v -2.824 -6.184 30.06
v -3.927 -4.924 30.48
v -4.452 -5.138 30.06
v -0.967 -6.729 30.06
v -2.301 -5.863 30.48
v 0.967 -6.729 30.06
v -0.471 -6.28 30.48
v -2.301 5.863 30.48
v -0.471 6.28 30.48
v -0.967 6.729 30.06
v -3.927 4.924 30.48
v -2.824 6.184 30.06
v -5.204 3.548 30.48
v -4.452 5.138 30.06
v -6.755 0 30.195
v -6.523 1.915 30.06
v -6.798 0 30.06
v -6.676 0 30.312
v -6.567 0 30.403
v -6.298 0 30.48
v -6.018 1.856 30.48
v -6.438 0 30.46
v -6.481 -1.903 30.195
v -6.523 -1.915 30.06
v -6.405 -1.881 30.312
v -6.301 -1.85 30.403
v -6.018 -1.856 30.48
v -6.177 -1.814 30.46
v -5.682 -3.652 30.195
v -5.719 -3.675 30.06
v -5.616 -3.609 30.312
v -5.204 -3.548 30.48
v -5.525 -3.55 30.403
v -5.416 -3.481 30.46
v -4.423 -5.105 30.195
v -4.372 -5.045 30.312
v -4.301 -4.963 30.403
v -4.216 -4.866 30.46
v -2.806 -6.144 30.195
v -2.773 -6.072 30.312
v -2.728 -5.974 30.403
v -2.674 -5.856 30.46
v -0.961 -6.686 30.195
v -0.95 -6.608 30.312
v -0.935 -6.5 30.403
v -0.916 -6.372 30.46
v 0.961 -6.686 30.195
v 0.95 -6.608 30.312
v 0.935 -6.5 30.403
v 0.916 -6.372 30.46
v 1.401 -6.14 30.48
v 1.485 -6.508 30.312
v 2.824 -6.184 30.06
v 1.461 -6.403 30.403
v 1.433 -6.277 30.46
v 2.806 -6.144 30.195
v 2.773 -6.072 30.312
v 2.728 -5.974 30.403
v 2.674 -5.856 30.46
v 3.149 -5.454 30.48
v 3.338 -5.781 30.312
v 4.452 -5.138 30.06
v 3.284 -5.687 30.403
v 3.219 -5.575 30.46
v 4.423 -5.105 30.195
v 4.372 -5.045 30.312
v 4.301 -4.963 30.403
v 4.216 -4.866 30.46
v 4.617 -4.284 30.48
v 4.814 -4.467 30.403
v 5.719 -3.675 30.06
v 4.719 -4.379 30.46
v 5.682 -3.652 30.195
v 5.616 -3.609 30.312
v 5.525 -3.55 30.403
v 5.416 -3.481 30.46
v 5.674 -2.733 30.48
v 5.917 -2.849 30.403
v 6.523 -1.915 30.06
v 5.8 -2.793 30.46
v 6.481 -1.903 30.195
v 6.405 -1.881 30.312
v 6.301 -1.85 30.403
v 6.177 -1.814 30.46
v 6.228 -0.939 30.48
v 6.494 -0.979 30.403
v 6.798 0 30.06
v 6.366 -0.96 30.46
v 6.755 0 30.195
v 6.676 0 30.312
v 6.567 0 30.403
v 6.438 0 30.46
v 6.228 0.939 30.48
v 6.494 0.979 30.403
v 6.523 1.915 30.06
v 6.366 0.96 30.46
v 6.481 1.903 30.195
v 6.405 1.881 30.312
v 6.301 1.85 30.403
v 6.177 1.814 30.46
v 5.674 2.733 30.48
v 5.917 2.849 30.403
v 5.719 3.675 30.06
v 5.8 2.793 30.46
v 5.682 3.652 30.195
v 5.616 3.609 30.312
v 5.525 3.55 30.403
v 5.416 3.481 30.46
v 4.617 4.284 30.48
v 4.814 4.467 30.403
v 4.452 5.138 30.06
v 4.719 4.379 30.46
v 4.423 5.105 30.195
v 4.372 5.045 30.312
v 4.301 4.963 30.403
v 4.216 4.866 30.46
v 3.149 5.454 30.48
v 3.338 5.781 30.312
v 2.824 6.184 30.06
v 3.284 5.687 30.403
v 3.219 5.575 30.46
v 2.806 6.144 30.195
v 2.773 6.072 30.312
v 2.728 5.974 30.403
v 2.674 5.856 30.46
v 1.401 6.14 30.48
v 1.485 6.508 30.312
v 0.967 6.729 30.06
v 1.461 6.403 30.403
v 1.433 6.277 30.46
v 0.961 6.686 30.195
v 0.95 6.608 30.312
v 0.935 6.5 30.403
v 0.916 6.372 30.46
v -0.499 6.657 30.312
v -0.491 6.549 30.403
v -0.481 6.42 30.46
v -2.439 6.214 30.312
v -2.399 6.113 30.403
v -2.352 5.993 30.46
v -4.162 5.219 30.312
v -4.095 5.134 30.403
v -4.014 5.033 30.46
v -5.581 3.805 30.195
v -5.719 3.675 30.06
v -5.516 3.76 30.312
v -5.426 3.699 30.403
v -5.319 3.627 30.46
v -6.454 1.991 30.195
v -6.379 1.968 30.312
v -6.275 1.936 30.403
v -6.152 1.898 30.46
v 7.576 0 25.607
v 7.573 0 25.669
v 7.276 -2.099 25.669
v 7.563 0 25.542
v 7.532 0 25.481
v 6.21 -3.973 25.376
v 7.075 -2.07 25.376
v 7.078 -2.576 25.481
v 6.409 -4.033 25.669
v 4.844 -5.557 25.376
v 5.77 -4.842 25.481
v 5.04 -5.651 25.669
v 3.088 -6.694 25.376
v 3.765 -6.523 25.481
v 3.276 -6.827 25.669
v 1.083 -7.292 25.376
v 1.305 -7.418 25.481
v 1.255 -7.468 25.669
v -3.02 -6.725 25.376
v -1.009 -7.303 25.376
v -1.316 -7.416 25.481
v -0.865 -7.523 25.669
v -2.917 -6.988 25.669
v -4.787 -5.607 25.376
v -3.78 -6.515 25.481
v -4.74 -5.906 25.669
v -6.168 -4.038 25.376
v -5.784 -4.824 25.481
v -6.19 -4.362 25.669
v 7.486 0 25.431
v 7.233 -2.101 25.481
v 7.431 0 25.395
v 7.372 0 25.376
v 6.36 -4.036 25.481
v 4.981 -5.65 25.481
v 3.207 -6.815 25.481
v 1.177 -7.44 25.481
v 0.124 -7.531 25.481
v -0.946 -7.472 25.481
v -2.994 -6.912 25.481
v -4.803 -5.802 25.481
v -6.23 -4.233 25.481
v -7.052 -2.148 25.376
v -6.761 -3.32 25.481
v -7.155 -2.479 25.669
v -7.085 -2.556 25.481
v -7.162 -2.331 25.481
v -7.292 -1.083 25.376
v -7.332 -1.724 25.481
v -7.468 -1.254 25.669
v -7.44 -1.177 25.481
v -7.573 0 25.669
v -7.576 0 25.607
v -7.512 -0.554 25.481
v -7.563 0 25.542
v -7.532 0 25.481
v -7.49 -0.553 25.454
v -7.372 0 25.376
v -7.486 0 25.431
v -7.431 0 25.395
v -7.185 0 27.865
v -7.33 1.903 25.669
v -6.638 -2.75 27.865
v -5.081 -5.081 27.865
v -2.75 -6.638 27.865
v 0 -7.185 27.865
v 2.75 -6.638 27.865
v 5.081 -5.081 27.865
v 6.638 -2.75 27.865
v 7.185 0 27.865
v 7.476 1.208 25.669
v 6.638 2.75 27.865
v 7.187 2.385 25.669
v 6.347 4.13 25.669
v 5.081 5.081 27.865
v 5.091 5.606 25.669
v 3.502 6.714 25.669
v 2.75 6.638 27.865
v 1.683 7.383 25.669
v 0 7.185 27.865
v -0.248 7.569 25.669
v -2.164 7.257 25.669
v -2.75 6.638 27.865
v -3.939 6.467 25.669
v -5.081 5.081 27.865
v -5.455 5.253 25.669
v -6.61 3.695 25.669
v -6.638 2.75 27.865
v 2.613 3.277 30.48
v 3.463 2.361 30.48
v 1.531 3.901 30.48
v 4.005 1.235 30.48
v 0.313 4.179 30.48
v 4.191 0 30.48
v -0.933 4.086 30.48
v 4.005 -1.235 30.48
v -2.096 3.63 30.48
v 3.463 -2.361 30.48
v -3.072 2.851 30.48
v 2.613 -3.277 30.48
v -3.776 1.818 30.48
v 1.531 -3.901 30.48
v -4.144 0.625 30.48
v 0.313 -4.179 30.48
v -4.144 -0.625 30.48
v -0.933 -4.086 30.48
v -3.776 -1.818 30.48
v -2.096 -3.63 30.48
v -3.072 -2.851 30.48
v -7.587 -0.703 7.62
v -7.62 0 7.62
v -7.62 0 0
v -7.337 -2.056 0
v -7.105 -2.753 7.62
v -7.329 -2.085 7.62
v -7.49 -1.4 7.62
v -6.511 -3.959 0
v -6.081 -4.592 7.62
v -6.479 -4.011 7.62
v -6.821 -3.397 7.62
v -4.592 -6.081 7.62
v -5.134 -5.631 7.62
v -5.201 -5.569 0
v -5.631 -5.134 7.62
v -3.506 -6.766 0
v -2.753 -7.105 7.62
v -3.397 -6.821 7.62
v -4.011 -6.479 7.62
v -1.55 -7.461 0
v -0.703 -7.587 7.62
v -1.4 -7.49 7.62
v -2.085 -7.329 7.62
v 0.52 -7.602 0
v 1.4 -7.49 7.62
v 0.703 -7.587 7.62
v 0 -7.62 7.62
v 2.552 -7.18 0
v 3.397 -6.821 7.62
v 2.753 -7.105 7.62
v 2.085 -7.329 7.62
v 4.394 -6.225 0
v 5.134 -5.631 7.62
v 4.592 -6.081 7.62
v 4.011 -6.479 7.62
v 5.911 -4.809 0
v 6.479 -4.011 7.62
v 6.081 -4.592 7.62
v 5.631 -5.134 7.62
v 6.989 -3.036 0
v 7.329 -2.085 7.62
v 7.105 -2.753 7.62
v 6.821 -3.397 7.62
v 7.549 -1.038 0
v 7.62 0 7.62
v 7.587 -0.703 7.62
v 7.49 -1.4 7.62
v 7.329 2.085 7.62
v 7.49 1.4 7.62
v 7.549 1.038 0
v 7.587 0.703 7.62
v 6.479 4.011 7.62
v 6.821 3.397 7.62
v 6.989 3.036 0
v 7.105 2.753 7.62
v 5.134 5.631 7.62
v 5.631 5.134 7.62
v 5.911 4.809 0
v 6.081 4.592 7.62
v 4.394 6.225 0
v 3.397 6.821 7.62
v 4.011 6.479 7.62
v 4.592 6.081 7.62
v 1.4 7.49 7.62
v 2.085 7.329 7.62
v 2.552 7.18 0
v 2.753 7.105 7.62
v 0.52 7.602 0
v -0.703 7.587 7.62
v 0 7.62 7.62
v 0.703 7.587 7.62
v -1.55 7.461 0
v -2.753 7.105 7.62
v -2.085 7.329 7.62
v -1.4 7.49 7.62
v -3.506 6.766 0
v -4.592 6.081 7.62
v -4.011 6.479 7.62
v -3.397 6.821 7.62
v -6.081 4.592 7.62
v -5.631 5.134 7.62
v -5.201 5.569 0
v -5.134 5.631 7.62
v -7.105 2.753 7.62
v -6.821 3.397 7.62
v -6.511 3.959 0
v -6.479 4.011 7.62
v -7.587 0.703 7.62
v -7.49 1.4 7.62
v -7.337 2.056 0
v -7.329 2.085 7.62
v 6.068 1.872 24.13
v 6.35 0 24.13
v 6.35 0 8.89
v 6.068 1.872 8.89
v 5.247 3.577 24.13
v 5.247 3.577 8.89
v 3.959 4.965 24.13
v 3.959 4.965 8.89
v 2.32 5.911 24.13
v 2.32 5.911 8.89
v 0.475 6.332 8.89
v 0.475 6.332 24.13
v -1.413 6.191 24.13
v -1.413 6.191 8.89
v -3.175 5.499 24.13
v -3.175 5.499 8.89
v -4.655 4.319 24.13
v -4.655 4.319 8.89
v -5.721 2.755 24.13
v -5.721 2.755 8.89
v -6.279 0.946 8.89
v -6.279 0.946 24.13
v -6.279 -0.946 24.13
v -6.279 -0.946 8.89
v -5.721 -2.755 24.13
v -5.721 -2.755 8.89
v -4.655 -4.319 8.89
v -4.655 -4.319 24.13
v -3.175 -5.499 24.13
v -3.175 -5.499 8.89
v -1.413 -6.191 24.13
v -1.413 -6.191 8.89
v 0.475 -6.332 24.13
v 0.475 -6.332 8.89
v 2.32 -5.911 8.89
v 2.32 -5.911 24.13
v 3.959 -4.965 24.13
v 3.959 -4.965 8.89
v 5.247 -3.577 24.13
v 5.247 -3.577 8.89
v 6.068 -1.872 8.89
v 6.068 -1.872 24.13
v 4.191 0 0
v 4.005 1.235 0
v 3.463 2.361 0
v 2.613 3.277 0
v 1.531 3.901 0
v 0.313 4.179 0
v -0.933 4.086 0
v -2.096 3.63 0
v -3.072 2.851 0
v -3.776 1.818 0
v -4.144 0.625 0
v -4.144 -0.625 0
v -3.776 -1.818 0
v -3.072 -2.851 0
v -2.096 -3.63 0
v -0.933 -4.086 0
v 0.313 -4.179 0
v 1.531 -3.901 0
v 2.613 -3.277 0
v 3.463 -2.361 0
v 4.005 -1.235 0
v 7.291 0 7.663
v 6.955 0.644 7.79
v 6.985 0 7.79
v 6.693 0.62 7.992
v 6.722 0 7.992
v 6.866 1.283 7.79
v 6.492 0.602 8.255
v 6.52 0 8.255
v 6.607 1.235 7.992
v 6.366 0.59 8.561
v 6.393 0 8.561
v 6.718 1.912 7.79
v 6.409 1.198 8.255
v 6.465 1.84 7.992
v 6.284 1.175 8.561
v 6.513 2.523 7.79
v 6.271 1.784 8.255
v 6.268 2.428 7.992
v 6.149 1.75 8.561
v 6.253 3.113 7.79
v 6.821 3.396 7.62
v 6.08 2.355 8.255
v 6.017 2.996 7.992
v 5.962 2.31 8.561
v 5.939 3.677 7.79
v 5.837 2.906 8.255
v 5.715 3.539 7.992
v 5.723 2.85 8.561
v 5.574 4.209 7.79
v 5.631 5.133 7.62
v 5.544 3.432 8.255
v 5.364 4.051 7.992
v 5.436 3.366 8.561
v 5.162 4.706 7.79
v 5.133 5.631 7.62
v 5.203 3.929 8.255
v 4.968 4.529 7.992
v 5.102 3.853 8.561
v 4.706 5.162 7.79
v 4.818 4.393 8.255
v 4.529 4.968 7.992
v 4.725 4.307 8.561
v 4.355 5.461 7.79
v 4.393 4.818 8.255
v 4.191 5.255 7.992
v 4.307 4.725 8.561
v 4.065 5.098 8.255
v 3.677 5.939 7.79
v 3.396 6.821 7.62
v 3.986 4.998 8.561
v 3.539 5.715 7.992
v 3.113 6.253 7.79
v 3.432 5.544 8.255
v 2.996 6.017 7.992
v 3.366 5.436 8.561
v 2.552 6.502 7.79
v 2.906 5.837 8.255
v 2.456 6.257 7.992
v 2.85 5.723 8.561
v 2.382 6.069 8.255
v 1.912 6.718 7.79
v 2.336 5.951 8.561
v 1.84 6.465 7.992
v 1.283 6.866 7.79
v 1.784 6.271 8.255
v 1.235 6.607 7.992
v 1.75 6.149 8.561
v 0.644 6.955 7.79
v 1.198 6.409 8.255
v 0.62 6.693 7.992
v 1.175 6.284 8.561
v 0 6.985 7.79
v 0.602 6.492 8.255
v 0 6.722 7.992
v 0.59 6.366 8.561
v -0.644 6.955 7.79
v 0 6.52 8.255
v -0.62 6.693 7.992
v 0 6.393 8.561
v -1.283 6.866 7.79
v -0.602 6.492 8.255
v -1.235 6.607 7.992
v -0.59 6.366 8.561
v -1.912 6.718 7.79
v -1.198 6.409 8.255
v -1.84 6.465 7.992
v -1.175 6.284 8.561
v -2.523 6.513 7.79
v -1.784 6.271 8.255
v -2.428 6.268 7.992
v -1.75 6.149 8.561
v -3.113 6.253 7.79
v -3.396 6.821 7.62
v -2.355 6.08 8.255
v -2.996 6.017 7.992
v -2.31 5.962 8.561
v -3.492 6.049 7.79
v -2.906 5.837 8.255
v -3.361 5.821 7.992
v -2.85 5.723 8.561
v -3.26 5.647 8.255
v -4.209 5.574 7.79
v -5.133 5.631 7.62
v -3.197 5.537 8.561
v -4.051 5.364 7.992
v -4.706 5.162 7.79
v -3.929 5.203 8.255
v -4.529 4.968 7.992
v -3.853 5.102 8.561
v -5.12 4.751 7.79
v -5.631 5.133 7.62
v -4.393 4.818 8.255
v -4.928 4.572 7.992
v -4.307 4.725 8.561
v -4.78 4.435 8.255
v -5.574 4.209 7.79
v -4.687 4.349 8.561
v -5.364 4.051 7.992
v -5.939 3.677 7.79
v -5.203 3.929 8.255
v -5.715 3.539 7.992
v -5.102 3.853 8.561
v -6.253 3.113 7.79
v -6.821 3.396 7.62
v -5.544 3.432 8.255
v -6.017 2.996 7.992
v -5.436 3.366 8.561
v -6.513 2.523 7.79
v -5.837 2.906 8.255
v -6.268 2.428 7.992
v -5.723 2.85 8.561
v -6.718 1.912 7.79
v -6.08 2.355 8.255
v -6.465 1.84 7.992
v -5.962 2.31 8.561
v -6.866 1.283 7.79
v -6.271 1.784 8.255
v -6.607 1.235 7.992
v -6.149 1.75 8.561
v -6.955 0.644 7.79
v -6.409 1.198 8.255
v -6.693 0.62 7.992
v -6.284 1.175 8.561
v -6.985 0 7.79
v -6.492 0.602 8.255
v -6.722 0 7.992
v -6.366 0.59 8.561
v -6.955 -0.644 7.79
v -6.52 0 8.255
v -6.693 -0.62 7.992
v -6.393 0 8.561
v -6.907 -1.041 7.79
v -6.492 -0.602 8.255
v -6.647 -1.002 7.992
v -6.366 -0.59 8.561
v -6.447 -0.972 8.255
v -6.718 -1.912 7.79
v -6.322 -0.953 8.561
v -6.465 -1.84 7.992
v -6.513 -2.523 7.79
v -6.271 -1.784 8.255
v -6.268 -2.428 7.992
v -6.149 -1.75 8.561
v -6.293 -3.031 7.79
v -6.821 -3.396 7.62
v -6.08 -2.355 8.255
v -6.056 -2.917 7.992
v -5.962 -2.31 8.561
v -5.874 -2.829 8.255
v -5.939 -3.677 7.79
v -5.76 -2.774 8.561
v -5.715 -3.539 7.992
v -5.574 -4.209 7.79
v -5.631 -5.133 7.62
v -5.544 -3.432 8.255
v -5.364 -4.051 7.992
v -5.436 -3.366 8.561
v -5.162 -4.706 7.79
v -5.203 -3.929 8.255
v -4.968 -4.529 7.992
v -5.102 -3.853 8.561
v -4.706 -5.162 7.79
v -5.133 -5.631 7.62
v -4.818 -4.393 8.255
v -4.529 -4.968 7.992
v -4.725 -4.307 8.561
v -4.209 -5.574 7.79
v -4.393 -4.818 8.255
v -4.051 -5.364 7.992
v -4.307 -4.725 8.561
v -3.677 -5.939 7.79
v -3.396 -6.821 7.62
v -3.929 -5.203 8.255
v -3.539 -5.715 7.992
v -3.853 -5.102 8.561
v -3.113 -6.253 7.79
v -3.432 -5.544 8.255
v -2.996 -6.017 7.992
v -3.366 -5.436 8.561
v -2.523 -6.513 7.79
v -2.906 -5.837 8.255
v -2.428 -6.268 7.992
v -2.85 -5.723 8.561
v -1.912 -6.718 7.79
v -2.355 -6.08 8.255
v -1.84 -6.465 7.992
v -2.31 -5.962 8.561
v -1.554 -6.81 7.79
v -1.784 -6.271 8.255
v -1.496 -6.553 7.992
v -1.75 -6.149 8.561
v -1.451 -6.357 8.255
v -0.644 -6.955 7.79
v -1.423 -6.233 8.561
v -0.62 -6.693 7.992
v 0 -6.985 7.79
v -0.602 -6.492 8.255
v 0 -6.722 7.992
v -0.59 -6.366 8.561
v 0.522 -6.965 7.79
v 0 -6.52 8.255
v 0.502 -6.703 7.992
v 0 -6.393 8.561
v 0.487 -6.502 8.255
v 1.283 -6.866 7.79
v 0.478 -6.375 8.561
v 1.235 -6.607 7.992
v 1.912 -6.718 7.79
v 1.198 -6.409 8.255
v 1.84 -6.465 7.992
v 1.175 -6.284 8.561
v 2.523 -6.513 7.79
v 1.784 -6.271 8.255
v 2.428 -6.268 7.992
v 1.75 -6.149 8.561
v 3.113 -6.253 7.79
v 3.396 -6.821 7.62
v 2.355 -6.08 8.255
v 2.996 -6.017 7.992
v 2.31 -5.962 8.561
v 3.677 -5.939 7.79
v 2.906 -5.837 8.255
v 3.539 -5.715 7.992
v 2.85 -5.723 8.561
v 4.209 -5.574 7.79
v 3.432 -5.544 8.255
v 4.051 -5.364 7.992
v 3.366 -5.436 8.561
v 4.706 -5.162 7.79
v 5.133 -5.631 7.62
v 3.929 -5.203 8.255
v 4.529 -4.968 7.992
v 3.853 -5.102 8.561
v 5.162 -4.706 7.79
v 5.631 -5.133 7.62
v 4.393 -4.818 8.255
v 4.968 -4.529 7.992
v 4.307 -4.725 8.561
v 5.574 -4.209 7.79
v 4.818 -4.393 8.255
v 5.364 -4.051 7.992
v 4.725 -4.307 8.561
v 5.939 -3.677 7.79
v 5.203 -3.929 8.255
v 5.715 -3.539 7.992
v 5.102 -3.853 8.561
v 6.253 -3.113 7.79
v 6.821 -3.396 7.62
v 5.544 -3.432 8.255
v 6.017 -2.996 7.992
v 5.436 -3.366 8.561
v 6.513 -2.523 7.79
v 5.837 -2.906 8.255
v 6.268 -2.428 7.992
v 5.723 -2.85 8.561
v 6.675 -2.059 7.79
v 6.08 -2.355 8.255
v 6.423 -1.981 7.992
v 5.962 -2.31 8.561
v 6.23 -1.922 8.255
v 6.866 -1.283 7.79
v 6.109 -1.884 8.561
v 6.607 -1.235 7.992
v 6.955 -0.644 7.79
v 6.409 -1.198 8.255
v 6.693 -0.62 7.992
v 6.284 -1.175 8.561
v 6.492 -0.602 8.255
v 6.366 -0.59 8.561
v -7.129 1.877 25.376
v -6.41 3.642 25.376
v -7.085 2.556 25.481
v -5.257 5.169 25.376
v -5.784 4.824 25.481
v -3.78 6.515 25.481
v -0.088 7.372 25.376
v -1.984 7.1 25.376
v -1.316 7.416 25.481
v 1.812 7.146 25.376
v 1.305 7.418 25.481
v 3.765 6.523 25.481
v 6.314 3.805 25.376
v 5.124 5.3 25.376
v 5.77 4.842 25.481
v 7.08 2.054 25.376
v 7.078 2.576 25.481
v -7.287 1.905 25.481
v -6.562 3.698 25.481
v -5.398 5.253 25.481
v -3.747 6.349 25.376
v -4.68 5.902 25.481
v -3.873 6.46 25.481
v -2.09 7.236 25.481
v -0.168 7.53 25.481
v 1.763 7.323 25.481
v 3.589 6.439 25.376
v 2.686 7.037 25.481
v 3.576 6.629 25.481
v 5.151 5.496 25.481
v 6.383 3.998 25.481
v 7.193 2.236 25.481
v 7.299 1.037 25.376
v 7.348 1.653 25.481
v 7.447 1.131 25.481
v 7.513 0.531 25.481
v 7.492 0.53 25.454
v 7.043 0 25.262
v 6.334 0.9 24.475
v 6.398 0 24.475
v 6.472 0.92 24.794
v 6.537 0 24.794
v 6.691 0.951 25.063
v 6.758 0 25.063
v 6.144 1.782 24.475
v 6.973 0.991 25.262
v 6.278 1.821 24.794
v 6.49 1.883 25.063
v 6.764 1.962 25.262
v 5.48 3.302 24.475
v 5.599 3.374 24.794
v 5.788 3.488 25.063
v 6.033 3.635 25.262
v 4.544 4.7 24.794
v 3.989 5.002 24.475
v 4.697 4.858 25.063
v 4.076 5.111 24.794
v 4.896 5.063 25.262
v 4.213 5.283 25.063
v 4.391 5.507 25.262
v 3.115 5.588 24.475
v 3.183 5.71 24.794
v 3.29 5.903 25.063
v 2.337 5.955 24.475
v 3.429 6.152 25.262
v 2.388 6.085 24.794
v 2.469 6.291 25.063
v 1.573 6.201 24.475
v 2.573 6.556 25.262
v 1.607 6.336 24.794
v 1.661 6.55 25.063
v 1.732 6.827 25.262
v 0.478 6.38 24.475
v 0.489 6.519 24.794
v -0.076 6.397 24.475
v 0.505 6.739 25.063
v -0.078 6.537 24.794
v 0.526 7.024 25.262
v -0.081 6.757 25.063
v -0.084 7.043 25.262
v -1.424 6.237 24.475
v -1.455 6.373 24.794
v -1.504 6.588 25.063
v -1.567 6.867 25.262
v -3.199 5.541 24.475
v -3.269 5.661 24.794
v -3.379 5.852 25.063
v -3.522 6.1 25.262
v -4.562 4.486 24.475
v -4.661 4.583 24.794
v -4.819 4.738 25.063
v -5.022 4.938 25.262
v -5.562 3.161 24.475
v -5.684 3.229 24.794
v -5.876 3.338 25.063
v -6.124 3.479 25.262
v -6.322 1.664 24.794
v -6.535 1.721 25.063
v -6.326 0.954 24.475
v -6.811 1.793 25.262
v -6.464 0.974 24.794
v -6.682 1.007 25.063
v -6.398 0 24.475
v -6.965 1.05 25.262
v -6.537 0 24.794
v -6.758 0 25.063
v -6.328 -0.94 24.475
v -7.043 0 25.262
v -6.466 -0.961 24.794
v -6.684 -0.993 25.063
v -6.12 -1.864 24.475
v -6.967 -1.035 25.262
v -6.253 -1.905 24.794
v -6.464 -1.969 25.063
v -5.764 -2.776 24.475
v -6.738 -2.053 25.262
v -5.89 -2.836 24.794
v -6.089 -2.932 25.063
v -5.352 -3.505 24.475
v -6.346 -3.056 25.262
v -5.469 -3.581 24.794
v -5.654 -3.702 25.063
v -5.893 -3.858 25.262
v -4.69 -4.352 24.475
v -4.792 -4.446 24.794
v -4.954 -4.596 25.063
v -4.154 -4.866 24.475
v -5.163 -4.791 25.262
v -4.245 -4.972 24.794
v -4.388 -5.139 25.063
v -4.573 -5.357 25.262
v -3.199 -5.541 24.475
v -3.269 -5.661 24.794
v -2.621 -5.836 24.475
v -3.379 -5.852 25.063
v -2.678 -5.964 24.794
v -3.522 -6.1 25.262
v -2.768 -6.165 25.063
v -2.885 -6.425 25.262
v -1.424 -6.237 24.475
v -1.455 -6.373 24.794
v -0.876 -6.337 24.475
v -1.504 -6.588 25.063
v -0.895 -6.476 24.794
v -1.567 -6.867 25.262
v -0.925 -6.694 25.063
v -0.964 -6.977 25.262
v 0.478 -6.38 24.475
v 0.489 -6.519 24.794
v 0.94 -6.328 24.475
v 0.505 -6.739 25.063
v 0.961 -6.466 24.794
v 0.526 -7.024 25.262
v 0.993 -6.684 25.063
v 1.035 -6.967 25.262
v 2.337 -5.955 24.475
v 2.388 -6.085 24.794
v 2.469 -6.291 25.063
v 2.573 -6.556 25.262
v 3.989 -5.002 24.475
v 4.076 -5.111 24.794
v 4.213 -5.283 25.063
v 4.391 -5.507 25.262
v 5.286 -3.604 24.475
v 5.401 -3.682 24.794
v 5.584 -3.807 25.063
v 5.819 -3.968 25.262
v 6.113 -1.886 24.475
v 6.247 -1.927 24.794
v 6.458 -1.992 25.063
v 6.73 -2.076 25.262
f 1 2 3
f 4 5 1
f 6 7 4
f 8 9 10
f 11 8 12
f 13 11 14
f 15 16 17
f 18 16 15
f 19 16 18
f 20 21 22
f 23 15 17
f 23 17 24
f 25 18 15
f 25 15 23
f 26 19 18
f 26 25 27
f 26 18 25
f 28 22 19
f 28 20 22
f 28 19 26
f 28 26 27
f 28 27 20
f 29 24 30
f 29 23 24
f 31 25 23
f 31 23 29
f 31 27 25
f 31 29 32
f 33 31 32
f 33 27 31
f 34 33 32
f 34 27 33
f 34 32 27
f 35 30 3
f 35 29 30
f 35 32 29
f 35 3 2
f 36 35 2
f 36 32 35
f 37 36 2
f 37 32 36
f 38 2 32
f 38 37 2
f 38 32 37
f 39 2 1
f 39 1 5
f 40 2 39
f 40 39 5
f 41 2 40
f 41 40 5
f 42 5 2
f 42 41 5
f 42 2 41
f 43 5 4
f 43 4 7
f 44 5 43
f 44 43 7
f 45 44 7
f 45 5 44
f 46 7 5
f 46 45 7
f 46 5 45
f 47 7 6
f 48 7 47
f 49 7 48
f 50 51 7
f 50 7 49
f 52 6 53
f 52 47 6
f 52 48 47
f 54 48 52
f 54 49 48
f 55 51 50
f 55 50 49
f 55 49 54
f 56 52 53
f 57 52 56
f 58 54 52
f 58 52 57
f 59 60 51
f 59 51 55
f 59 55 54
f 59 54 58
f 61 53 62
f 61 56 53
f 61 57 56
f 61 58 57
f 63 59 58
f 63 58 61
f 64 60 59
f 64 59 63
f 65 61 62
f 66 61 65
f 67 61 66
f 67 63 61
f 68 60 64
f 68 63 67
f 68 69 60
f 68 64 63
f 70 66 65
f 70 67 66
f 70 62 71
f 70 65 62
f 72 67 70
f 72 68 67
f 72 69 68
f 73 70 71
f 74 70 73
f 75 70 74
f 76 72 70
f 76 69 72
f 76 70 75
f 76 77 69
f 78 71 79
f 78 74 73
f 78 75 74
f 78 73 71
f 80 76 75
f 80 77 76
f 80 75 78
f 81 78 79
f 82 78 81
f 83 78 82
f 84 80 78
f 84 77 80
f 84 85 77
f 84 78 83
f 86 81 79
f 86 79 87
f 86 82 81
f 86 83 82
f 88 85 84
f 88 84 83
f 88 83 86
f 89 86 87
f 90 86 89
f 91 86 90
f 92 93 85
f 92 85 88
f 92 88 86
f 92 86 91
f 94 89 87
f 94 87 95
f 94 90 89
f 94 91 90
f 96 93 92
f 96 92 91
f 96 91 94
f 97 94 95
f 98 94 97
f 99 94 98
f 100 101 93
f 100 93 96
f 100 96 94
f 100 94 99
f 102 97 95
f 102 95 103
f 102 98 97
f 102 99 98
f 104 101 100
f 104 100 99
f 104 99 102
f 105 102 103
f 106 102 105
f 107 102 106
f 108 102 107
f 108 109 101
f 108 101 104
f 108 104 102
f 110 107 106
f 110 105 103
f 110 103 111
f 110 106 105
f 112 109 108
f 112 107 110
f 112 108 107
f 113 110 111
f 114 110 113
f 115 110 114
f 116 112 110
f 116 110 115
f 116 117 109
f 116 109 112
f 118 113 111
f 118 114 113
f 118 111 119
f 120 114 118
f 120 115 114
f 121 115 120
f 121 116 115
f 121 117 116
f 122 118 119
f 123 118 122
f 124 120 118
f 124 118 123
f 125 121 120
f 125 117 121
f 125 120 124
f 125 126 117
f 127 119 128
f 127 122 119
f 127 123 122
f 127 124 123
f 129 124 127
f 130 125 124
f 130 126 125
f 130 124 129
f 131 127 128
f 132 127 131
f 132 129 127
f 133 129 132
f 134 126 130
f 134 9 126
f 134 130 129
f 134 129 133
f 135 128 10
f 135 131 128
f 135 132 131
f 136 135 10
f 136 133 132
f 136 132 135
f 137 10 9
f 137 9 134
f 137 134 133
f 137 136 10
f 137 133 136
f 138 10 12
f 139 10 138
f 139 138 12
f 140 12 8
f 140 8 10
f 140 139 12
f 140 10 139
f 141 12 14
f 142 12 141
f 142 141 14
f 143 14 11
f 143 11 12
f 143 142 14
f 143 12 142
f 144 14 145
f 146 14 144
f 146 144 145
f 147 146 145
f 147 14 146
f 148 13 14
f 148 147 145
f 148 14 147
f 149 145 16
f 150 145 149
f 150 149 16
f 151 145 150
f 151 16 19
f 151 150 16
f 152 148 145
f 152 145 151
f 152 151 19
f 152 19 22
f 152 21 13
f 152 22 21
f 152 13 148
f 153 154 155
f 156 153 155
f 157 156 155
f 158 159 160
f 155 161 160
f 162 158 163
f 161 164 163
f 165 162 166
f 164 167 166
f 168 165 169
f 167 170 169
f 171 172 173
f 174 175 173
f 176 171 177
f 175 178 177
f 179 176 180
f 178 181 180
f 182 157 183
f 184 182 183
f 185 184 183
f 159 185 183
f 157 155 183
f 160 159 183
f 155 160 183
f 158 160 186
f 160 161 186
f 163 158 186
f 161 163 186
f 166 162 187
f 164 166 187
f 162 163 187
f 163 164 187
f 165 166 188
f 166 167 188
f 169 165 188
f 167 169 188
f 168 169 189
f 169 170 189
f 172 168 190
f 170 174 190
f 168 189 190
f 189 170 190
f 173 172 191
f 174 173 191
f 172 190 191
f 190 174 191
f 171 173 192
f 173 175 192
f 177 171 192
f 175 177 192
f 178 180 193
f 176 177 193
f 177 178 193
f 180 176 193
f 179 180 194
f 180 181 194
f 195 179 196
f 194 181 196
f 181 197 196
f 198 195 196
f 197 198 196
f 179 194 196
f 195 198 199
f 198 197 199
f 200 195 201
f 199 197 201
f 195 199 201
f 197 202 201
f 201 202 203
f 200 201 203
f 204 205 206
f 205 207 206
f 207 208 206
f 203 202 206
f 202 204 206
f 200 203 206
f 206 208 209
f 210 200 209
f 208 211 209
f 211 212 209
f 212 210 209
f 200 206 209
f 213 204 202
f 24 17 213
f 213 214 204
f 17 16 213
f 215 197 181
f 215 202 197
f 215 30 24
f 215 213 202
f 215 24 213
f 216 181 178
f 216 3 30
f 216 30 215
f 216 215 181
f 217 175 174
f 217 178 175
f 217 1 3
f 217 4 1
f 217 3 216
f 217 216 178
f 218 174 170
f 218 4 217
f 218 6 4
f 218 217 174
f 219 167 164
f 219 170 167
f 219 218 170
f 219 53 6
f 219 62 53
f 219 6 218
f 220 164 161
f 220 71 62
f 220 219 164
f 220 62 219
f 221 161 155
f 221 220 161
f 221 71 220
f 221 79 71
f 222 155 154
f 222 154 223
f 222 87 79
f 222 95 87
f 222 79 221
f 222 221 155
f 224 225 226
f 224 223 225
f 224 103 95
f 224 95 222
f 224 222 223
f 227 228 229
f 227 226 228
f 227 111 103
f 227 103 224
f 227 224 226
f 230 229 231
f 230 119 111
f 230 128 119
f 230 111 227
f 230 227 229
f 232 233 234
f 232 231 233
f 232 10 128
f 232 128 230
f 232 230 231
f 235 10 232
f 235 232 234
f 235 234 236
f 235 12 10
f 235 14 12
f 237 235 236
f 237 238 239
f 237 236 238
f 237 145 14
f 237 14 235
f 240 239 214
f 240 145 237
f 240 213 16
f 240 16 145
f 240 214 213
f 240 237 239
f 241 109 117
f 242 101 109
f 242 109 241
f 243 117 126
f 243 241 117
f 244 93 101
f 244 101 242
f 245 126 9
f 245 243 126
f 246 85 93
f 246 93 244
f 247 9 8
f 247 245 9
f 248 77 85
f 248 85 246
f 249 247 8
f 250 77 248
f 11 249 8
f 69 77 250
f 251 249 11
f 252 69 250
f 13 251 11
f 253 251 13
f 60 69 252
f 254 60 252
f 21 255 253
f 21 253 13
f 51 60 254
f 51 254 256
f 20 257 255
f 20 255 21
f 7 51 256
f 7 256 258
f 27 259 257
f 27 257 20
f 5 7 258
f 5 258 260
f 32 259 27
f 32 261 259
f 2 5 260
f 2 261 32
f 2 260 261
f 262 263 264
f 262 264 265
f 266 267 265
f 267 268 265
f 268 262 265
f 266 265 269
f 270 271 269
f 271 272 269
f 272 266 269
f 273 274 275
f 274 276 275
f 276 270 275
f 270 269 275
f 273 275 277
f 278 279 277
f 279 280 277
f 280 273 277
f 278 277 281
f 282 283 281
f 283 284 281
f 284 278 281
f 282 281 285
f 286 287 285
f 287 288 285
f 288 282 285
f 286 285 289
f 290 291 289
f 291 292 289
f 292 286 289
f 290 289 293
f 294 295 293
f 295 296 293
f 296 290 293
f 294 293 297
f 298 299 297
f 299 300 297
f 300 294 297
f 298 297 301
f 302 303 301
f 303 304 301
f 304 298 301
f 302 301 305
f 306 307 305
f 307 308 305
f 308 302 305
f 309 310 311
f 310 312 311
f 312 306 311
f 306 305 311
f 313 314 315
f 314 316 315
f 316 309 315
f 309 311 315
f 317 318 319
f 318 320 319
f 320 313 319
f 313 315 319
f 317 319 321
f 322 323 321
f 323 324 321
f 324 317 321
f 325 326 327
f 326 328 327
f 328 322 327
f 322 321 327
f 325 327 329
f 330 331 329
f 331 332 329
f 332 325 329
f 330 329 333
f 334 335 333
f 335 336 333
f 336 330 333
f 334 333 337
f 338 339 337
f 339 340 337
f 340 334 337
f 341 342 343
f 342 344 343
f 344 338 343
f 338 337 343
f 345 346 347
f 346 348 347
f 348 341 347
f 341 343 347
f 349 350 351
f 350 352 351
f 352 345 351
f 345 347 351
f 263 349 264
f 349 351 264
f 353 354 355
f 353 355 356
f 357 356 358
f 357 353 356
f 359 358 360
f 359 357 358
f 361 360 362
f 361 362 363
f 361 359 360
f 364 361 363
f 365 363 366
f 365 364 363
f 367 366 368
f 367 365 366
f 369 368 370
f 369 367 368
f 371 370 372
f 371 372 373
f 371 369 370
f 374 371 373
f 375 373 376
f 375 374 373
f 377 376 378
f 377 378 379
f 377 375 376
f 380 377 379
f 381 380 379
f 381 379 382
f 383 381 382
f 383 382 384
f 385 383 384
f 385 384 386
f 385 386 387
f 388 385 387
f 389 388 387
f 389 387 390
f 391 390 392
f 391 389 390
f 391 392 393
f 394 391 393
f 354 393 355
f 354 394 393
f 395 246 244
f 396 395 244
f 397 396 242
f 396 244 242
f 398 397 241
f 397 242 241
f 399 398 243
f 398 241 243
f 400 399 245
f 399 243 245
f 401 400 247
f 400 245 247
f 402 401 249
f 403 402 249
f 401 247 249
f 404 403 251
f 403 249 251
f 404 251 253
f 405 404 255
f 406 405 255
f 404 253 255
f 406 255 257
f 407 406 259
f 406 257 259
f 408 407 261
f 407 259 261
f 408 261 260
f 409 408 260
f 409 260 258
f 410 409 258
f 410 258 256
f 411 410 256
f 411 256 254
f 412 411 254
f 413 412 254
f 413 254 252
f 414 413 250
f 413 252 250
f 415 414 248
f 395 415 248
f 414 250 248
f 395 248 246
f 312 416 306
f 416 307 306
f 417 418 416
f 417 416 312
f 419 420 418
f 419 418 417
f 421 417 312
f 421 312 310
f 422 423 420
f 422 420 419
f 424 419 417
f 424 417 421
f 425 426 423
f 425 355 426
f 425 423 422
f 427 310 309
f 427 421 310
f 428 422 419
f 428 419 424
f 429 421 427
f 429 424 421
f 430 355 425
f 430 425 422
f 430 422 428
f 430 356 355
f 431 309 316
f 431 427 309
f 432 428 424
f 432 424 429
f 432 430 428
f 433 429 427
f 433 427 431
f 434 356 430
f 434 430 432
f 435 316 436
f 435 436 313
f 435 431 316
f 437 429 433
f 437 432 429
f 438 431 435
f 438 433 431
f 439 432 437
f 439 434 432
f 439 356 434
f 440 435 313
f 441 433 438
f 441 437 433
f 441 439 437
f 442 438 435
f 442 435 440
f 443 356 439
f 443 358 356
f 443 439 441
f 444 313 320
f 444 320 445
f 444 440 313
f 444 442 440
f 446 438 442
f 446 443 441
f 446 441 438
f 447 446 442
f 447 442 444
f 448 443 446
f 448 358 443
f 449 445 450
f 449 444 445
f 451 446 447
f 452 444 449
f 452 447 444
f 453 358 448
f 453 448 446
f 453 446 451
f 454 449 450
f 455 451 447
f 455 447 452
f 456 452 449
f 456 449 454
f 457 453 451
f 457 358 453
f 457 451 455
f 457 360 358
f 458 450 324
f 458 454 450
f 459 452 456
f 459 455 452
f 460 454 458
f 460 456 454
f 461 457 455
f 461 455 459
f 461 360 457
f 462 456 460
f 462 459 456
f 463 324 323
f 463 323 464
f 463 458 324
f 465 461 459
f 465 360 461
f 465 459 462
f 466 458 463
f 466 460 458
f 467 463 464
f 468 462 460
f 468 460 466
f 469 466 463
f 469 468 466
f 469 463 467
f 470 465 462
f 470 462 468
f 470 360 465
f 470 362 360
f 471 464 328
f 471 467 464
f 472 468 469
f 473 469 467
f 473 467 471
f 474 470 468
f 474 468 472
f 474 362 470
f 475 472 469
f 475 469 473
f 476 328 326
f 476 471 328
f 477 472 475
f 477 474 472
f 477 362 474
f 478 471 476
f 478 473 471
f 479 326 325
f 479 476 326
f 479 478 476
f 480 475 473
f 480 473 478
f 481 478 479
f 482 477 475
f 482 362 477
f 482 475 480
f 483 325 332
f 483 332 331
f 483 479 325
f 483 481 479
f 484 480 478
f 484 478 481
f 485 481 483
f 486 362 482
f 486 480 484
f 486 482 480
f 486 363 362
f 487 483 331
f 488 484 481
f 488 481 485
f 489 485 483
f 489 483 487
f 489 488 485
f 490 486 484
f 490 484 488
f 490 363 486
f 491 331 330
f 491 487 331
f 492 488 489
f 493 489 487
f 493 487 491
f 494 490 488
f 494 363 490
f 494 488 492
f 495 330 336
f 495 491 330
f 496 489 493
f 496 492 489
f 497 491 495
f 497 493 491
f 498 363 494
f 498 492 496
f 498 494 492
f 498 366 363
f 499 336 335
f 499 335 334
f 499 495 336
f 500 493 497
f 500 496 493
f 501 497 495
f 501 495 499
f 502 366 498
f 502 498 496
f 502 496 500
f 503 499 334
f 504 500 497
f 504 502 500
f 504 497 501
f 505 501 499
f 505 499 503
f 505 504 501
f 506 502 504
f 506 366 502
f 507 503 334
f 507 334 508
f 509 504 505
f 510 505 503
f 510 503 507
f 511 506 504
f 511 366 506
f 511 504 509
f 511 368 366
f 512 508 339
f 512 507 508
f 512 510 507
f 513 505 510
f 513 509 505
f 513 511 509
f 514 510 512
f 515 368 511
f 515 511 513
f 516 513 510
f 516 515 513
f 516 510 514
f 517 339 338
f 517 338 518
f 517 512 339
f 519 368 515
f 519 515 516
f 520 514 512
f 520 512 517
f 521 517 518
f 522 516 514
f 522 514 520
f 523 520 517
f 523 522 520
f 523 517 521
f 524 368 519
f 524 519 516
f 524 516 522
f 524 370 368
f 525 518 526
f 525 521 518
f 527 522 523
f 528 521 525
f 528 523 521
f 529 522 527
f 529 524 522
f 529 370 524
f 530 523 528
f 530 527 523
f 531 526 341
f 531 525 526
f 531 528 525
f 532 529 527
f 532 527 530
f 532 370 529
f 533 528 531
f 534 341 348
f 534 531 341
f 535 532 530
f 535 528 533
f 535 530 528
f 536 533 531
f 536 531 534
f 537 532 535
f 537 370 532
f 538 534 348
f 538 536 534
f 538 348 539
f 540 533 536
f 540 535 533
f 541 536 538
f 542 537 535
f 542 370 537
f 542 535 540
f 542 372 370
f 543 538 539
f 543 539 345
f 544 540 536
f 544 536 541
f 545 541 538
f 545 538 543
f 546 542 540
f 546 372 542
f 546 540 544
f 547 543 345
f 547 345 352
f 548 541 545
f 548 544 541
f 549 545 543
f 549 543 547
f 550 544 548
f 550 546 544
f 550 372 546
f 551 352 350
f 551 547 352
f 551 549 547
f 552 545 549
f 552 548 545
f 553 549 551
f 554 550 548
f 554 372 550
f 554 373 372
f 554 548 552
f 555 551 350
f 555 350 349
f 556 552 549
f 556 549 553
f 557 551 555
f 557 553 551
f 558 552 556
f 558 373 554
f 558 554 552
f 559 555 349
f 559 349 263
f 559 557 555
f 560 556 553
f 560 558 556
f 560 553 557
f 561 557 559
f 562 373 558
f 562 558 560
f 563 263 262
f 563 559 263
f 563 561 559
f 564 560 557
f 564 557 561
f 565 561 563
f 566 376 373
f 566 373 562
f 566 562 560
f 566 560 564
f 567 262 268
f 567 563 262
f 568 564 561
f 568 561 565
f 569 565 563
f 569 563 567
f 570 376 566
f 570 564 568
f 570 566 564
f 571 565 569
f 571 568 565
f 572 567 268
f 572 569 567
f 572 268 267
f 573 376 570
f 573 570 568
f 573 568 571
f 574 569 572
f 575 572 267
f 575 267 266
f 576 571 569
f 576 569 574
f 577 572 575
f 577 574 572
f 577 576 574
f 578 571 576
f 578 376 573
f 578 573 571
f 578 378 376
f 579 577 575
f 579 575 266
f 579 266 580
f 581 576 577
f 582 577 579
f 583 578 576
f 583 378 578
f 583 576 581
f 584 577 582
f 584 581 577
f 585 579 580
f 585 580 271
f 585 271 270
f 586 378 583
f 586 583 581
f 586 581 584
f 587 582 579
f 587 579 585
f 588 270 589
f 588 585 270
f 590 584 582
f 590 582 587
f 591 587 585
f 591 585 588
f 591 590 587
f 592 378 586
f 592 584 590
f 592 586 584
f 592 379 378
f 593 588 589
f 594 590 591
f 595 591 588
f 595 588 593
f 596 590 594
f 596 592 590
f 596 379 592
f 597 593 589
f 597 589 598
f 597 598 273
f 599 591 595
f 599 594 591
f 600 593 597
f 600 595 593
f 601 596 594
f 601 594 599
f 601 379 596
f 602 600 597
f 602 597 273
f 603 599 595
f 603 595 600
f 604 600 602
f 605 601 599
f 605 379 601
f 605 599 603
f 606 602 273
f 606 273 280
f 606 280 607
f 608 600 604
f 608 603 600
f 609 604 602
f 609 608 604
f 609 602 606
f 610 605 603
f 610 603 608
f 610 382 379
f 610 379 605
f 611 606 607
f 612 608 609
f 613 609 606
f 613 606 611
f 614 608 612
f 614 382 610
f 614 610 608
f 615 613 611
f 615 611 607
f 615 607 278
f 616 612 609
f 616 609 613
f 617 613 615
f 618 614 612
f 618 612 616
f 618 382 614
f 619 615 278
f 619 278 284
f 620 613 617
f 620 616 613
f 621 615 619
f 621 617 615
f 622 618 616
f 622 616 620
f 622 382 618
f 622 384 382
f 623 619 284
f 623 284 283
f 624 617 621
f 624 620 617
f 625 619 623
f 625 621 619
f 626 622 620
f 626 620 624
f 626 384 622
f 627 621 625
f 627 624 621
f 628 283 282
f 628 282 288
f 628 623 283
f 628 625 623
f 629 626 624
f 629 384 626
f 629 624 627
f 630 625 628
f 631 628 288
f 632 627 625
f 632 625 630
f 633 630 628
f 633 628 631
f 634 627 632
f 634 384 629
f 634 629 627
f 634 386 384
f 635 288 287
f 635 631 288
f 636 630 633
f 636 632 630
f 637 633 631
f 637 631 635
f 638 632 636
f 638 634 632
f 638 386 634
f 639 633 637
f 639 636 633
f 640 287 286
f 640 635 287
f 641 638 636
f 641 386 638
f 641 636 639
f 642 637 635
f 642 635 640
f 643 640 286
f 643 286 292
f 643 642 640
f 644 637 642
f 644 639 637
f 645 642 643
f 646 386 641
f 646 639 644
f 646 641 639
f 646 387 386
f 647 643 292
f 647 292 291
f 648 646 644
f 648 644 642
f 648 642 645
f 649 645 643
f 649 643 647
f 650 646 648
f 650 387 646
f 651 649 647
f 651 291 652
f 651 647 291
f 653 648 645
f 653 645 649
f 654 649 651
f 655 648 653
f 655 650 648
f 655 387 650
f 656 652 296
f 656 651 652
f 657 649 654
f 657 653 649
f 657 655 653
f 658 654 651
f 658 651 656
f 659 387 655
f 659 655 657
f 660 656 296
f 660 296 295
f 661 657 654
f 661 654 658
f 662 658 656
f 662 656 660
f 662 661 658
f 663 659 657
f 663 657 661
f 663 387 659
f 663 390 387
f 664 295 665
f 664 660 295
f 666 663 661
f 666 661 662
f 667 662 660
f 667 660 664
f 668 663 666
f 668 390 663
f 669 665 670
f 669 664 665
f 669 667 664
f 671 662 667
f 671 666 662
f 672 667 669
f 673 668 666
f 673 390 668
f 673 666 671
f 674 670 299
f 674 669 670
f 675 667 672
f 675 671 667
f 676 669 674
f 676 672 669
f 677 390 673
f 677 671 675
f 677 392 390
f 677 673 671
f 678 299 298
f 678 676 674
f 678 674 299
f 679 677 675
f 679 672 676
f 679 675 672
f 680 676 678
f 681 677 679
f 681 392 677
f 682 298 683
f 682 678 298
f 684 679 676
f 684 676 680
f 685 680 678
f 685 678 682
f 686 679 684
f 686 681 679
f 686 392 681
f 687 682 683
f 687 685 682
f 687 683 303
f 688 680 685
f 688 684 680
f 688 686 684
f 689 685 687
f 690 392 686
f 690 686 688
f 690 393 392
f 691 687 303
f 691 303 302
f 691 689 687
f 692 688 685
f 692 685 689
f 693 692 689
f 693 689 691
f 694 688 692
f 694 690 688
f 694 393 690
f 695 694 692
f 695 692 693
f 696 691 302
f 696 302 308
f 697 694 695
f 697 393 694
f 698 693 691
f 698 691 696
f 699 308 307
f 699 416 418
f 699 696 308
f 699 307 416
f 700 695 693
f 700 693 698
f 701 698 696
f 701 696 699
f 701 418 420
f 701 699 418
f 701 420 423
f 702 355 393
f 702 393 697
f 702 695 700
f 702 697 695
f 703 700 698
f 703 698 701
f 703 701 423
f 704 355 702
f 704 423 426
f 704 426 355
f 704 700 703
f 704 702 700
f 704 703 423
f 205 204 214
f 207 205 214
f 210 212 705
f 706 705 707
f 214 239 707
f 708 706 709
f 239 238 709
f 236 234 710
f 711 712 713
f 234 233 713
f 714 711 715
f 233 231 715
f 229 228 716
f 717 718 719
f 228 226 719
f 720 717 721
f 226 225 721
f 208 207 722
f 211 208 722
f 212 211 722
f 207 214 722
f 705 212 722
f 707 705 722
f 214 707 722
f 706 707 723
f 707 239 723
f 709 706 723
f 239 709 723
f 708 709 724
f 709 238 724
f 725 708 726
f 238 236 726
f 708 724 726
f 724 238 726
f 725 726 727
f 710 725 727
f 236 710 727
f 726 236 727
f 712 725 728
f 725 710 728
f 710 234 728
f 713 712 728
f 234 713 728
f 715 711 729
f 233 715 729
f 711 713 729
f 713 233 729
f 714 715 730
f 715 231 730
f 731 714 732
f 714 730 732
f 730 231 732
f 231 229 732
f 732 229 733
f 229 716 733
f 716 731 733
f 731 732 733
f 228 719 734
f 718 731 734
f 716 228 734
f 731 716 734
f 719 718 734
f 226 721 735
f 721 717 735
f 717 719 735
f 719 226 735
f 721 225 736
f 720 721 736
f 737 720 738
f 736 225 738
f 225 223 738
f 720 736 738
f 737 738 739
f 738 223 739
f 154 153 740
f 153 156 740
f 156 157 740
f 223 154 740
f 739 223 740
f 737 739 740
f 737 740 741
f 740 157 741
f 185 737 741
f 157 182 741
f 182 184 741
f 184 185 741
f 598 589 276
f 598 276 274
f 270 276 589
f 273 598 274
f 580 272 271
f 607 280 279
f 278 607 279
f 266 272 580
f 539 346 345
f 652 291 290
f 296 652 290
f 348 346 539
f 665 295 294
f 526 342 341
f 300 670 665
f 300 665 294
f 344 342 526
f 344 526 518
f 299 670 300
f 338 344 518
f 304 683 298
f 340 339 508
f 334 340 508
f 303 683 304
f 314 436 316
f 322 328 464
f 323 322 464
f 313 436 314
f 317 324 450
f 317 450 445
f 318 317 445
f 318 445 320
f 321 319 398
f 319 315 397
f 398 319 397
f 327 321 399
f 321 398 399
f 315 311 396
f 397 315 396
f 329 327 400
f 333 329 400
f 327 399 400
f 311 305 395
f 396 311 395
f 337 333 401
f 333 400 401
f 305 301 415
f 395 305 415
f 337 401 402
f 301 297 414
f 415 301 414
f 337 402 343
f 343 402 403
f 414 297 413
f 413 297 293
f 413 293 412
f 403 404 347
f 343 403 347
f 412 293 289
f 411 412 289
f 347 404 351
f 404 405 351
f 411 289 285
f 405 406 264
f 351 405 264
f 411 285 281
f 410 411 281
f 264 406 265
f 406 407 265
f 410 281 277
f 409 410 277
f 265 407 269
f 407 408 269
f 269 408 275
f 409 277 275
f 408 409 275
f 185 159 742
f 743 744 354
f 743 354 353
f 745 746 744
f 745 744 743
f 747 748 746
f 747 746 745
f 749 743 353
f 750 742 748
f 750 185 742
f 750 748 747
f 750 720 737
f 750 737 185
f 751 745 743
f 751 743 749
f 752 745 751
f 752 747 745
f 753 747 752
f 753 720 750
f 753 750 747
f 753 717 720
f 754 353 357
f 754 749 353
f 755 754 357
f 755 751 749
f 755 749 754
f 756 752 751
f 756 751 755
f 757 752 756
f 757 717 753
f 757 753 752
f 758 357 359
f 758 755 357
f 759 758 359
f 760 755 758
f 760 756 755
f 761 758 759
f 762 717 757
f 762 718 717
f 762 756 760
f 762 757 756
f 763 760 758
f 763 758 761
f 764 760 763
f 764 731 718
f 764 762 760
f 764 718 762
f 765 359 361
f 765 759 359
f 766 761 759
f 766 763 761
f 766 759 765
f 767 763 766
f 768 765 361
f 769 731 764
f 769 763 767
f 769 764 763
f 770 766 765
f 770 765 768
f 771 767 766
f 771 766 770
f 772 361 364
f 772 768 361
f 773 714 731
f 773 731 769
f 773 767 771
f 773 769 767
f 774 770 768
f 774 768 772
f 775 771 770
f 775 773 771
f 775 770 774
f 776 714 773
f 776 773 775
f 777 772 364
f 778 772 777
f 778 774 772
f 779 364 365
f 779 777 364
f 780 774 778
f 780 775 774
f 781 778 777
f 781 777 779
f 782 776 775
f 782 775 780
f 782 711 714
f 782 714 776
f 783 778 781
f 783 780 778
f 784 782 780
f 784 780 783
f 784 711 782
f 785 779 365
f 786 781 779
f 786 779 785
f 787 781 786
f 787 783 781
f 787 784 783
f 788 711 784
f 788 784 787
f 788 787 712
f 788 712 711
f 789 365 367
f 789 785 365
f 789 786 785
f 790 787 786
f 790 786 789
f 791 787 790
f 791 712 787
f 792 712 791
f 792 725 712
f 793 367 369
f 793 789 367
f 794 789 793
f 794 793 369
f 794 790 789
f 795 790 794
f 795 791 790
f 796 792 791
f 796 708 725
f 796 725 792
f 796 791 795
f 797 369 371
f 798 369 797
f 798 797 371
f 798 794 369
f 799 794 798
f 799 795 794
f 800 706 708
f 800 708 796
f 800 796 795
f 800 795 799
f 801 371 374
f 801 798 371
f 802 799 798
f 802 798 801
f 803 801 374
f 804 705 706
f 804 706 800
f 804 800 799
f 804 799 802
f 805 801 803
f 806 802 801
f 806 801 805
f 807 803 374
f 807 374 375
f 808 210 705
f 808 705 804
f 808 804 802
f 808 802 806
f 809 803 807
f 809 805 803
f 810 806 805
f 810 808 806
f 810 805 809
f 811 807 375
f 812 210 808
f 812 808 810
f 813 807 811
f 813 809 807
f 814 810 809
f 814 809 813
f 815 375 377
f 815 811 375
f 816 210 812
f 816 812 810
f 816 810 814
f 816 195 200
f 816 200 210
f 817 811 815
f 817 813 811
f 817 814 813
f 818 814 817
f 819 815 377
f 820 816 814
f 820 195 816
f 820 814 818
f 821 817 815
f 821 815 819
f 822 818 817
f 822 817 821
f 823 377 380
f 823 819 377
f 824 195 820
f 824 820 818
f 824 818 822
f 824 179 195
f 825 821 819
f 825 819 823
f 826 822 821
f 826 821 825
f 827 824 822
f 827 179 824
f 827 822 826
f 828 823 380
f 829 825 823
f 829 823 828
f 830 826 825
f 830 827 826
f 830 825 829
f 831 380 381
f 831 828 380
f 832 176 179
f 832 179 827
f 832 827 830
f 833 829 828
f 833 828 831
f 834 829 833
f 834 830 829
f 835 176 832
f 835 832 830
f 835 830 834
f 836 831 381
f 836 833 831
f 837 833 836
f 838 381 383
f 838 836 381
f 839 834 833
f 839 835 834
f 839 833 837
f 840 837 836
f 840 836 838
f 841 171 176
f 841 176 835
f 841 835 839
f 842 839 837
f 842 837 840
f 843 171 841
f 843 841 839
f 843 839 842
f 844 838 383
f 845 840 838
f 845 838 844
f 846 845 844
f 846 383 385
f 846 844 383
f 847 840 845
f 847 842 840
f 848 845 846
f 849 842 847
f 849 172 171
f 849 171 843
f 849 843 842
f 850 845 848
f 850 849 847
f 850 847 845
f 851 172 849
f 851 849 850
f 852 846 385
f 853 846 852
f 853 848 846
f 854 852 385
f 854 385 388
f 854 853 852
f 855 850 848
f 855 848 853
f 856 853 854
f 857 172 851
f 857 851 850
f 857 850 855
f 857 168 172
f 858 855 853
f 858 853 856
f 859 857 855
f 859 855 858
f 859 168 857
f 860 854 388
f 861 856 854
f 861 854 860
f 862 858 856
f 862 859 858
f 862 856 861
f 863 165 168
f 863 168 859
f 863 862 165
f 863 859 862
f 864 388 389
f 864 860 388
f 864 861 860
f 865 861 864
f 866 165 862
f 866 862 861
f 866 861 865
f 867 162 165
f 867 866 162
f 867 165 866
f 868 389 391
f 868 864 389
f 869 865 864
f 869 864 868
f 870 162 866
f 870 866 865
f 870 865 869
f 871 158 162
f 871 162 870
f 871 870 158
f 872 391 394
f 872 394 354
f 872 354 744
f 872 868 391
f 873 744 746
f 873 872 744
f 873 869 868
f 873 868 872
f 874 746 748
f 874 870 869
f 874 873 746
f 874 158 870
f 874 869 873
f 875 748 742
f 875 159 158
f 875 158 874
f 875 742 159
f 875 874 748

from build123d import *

# Parameters (mm, degrees)
SKETCH1_R           = 7.62
BOSS_EXTRUDE1_DEPTH = 30.48
SKETCH2_R           = 4.191
CUT_EXTRUDE1_DEPTH  = 30.48
CUT_EXTRUDE2_START  = -5.08
SKETCH3_R           = 10.16
SKETCH3_R_2         = 6.35
CUT_EXTRUDE2_DEPTH  = 17.78
FILLET1_R           = 1.27
FILLET2_R           = 1.27
CHAMFER1_SIZE       = 5.08
CHAMFER1_SIZE_2     = 0.895741062
FILLET3_R           = 0.508
FILLET4_R           = 0.254


# Some blends are built 0.0001 mm under size
with BuildPart() as part:
    # Sketch1 → Boss-Extrude1 (new body)
    with BuildSketch(Plane.XY):
        with Locations(Location((0, 0, 0), (0, 0, 180))):
            Circle(SKETCH1_R)
    extrude(amount=BOSS_EXTRUDE1_DEPTH)

    # Sketch2 → Cut-Extrude1 (cut)
    with BuildSketch(Plane.XY.offset(30.48)):
        Circle(SKETCH2_R)
    extrude(amount=-CUT_EXTRUDE1_DEPTH, mode=Mode.SUBTRACT)

    # Sketch3 → Cut-Extrude2 (cut)
    with BuildSketch(Plane.XY.offset(30.48).offset(CUT_EXTRUDE2_START)):
        Circle(SKETCH3_R)
        Circle(SKETCH3_R_2, mode=Mode.SUBTRACT)
    extrude(amount=-CUT_EXTRUDE2_DEPTH, mode=Mode.SUBTRACT)

    # Fillet1
    fillet1_edges = [part.edges().sort_by_distance(p)[0] for p in [
        (-6.35, 0, 7.62),
    ]]
    fillet(fillet1_edges, radius=FILLET1_R - 0.0001)  # a hair under: the kernel refuses the full size

    # Fillet2
    fillet2_edges = [part.edges().sort_by_distance(p)[0] for p in [
        (-6.35, 0, 25.4),
    ]]
    fillet(fillet2_edges, radius=FILLET2_R - 0.0001)  # a hair under: the kernel refuses the full size

    # Chamfer1
    # the kernel refuses this chamfer: 5.08, 0.895741062 mm, written as the material it takes off along each edge
    with BuildSketch(Plane(origin=(0, 0, 30.48), x_dir=(-1, 0, 0), z_dir=(0, 1, 0))) as chamfer1_piece_1:
        Polygon((7.62, -CHAMFER1_SIZE), (7.62 - CHAMFER1_SIZE_2, 0), (7.62, 0), align=None)
    revolve(axis=Axis((0, 0, 30.48), (0, 0, 1)), mode=Mode.SUBTRACT)

    # Fillet3
    fillet3_edges = [part.edges().sort_by_distance(p)[0] for p in [
        (6.724258938, 0, 30.48),
    ]]
    fillet(fillet3_edges, radius=FILLET3_R)

    # Fillet4
    fillet4_edges = [part.edges().sort_by_distance(p)[0] for p in [
        (7.62, 0, 25.4),
    ]]
    fillet(fillet4_edges, radius=FILLET4_R)


solid = part.part
